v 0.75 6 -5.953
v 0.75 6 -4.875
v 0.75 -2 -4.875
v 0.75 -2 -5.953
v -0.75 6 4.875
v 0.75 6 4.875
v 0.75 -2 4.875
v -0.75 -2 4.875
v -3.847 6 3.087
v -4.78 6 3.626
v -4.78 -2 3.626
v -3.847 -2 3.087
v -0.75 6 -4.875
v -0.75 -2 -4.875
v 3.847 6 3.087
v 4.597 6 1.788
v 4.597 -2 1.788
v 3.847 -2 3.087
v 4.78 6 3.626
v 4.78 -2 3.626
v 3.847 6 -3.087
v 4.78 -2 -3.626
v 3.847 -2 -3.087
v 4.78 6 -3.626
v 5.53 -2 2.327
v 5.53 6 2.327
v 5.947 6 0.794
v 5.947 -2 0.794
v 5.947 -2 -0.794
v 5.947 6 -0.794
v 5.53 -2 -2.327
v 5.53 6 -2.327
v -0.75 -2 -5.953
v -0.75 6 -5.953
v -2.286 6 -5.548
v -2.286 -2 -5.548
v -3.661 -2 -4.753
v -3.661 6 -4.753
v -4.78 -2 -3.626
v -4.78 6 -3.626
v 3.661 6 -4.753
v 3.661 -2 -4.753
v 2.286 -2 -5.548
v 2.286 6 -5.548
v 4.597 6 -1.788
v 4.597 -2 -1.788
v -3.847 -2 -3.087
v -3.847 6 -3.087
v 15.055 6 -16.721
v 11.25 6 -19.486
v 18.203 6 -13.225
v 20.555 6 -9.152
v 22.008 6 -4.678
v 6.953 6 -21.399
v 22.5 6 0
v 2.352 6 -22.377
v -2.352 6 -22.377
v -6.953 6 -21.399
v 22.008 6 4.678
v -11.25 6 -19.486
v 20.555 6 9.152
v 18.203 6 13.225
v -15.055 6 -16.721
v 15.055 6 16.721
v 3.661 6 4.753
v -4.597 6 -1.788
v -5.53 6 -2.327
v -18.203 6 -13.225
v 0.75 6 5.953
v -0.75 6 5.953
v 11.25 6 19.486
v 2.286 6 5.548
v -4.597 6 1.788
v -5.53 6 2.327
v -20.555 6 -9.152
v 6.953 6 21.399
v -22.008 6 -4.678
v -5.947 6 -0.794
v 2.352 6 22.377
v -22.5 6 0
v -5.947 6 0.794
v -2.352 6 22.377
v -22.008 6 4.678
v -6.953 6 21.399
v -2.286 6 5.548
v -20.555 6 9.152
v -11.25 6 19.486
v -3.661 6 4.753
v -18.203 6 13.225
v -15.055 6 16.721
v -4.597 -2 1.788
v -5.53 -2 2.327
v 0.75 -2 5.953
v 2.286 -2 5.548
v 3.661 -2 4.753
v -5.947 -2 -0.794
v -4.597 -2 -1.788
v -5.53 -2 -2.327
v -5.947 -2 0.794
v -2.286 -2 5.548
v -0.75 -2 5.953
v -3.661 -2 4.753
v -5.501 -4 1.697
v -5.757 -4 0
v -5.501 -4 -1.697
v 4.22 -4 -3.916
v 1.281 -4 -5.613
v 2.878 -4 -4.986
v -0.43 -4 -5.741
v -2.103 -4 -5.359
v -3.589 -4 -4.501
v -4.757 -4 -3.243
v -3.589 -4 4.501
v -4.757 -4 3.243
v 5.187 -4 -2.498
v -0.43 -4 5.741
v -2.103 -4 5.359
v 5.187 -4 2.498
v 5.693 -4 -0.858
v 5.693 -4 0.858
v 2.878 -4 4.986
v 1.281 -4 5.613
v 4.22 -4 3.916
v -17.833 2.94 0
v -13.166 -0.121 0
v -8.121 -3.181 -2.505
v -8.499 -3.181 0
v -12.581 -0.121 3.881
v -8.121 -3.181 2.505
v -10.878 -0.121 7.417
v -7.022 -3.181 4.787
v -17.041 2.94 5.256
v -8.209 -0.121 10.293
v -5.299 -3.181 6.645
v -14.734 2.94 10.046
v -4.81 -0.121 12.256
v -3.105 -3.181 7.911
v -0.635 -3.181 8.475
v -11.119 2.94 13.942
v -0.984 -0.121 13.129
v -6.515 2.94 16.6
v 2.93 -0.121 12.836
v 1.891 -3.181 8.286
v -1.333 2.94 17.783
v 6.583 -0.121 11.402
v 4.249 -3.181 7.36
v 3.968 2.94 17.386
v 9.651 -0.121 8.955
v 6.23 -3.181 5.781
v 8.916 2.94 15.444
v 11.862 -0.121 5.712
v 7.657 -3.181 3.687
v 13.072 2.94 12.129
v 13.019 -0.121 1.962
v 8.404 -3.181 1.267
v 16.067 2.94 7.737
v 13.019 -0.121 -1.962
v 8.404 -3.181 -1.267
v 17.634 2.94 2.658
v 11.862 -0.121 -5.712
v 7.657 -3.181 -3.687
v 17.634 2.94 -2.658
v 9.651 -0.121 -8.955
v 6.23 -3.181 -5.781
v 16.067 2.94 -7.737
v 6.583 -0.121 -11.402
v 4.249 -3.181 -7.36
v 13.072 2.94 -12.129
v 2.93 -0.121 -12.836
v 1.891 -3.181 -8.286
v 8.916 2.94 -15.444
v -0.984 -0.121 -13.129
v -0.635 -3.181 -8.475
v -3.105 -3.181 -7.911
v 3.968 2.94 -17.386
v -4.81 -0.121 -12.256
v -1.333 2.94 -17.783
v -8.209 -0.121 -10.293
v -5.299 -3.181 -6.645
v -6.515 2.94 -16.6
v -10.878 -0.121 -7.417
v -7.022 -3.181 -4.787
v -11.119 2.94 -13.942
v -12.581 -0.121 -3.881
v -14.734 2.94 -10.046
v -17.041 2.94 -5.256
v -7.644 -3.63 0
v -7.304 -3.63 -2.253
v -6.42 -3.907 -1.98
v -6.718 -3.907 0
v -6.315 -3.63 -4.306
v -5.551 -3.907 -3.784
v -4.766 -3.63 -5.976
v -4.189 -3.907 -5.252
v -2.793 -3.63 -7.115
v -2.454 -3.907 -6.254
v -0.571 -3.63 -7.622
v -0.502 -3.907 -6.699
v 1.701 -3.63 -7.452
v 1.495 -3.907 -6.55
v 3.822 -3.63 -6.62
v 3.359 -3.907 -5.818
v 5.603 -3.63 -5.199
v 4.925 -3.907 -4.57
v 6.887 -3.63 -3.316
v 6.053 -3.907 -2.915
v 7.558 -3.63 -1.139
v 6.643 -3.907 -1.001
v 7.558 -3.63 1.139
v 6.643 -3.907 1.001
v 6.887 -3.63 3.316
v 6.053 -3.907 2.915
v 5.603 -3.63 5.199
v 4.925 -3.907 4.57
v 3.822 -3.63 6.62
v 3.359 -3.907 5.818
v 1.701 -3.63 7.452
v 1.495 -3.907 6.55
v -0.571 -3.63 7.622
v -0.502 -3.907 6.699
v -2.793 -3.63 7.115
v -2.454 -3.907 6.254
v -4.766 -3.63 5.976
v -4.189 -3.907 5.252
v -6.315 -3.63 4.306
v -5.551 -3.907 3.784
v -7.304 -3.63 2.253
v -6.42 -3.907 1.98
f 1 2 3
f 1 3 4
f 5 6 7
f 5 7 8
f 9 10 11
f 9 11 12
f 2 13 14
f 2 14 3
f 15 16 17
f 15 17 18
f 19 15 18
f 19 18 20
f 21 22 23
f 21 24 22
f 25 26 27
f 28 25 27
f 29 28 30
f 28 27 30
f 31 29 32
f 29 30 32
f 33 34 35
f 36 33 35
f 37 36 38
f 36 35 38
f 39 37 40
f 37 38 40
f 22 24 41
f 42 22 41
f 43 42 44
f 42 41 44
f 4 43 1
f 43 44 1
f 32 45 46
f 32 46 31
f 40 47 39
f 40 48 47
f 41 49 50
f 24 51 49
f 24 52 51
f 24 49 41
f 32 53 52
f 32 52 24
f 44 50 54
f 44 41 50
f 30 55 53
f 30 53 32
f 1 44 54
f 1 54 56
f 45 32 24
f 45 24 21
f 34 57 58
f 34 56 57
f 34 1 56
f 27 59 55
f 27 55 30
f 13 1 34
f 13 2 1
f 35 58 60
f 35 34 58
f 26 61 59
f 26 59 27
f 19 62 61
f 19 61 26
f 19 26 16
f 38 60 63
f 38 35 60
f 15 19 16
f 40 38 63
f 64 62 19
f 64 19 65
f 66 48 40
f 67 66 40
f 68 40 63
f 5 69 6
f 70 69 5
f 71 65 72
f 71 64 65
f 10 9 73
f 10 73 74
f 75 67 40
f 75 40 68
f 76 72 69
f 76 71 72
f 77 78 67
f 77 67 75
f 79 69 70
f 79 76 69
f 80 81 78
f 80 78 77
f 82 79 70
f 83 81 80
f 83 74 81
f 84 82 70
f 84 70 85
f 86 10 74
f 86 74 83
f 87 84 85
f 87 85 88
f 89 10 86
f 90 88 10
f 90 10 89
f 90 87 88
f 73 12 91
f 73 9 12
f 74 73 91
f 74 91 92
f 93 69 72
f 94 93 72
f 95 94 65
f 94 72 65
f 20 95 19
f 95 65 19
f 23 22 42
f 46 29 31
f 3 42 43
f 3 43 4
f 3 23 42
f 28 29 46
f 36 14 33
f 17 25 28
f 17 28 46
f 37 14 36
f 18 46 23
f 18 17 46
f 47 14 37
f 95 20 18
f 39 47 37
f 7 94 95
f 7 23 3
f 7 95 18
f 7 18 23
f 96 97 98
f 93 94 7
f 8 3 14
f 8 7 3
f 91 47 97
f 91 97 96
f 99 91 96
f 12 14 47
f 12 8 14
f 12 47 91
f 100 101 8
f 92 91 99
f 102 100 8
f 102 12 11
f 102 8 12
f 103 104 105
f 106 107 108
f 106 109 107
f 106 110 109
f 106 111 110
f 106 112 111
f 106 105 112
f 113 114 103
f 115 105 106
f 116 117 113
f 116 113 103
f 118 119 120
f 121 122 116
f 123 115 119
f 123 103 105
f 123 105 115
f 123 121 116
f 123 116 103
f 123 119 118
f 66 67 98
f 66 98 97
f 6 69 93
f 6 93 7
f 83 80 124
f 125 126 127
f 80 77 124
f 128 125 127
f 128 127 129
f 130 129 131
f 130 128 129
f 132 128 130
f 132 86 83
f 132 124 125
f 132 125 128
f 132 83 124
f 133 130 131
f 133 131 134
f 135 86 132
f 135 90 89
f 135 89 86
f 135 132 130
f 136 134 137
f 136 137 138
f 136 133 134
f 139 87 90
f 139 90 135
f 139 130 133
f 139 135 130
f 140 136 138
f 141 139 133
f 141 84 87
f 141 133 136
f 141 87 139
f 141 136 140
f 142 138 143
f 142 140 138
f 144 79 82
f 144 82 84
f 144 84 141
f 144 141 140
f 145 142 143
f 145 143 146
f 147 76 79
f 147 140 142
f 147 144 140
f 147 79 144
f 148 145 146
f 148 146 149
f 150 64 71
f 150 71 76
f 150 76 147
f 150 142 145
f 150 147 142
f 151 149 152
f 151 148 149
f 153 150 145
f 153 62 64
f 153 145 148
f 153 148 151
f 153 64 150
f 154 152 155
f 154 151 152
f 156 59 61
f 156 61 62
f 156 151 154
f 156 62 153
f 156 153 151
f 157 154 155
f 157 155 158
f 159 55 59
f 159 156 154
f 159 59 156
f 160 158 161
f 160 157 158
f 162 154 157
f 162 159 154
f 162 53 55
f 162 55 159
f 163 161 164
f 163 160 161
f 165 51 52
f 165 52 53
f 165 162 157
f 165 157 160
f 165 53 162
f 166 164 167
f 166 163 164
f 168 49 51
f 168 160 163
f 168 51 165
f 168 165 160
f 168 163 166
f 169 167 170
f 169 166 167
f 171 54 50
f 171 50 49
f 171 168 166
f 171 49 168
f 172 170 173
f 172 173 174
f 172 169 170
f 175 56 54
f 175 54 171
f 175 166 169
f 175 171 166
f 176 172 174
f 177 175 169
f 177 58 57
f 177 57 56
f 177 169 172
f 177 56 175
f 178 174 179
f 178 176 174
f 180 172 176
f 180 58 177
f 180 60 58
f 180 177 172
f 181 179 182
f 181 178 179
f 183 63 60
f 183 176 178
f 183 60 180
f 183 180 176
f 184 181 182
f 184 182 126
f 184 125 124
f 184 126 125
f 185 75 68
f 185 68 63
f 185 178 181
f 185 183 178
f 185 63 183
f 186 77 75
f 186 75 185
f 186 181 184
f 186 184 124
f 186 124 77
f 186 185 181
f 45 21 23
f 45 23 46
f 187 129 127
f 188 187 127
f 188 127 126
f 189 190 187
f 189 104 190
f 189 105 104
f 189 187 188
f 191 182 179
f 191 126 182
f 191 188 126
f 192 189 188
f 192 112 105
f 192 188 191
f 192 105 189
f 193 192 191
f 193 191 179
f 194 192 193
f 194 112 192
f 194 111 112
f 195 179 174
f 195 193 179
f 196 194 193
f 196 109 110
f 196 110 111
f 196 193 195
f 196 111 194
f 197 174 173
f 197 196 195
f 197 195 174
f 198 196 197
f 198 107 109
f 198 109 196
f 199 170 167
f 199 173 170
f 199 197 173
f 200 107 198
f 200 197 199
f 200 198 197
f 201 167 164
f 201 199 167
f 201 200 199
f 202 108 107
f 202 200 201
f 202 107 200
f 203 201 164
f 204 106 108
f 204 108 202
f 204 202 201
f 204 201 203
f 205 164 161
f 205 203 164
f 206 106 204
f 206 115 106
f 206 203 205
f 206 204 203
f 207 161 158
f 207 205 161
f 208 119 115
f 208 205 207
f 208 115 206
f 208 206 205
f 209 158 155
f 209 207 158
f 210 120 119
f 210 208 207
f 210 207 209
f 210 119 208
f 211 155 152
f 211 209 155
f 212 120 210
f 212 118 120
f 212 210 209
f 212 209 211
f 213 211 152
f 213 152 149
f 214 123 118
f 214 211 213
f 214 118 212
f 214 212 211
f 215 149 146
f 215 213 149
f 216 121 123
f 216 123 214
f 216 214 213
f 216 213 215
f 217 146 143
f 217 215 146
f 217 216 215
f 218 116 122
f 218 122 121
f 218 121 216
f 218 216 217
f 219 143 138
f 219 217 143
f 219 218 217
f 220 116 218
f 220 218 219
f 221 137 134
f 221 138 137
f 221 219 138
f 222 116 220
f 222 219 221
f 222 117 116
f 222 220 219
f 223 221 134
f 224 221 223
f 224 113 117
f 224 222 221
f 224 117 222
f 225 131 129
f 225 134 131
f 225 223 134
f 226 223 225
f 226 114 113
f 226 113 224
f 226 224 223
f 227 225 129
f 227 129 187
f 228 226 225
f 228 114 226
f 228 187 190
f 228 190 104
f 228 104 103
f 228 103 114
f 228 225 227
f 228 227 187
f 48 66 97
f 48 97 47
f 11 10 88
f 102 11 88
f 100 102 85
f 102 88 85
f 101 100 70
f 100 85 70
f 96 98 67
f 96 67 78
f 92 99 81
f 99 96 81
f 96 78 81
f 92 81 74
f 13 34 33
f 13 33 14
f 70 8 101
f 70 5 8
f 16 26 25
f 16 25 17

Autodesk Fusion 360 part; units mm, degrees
sketch "Sketch1" plane through (0, 0, 0) normal (0, 1, 0) x (1, 0, 0)
  circle A0 centre (0, 0) radius 5.25
  circle A1 centre (0, 0) radius 7.25
  dimension "d1" = 10.5
  dimension "d2" = 2
extrude "Extrude1" add sketch "Sketch1" along normal blind 6
sketch "Sketch2" plane through (0, 0, 0) normal (0, -1, 0) x (1, 0, 0)
  circle A0 centre (0, 0) radius 5.25
  circle A1 centre (0, 0) radius 7.25
  circle A2 centre (0, 0) radius 7.25
extrude "Extrude2" add sketch "Sketch2" along normal blind 4 contours A0 | A1 A2
sketch "Sketch3" plane through (0, 6, 0) normal (0, 1, 0) x (-1, 0, 0)
  circle A0 centre (0, 0) radius 5.25
  circle A1 centre (0, 0) radius 7.25
  circle A2 centre (0, 0) radius 7.25
  circle A3 centre (0, 0) radius 22.5
  dimension "d7" = 45
loft "Loft1" add profiles "Sketch3" section 1 contours A3 section 2 face at (1.965, -4, -0.3602)
sketch "Sketch4" plane through (0, 6, 0) normal (0, 1, 0) x (-1, 0, 0)
  circle A0 centre (0, 0) radius 22.5
  circle A1 centre (0, 0) radius 4.875 construction
  circle A2 centre (0, 0) radius 6
  line L0 (0, 0) -> (0, -6) construction
  line L1 (-0.75, -6) -> (0.75, -6)
  line L2 (0.75, -6) -> (0.75, -4.875)
  line L3 (0.75, -4.875) -> (-0.75, -4.875)
  line L4 (-0.75, -4.875) -> (-0.75, -6)
  line L5 (-0.75, -6) -> (0.75, -4.875) construction
  line L6 (0.75, -6) -> (-0.75, -4.875) construction
  line L7 (5.5712, -2.3505) -> (4.5969, -1.788)
  line L8 (4.5969, -1.788) -> (3.8469, -3.087)
  line L9 (3.8469, -3.087) -> (4.8212, -3.6495)
  line L10 (4.8212, -3.6495) -> (5.5712, -2.3505)
  line L11 (4.8212, 3.6495) -> (3.8469, 3.087)
  line L12 (3.8469, 3.087) -> (4.5969, 1.788)
  line L13 (4.5969, 1.788) -> (5.5712, 2.3505)
  line L14 (5.5712, 2.3505) -> (4.8212, 3.6495)
  line L15 (-0.75, 6) -> (-0.75, 4.875)
  line L16 (-0.75, 4.875) -> (0.75, 4.875)
  line L17 (0.75, 4.875) -> (0.75, 6)
  line L18 (0.75, 6) -> (-0.75, 6)
  line L19 (-5.5712, 2.3505) -> (-4.5969, 1.788)
  line L20 (-4.5969, 1.788) -> (-3.8469, 3.087)
  line L21 (-3.8469, 3.087) -> (-4.8212, 3.6495)
  line L22 (-4.8212, 3.6495) -> (-5.5712, 2.3505)
  line L23 (-4.8212, -3.6495) -> (-3.8469, -3.087)
  line L24 (-3.8469, -3.087) -> (-4.5969, -1.788)
  line L25 (-4.5969, -1.788) -> (-5.5712, -2.3505)
  line L26 (-5.5712, -2.3505) -> (-4.8212, -3.6495)
  point P0 (0, -5.4375)
  dimension "d8" = 9.75
  dimension "d9" = 12
  dimension "d10" = 1.5
  dimension "d12" = 360
extrude "Extrude3" cut sketch "Sketch4" against normal blind 8 contours A2 L2 L3 L4 L7 L8 L9 L11 L12 L13 L15 L16 L17 L19 L20 L21 L23 L24 L25
fillet "Fillet1" radius 5 1 edges at (-6.7594, -4, -2.6217)
